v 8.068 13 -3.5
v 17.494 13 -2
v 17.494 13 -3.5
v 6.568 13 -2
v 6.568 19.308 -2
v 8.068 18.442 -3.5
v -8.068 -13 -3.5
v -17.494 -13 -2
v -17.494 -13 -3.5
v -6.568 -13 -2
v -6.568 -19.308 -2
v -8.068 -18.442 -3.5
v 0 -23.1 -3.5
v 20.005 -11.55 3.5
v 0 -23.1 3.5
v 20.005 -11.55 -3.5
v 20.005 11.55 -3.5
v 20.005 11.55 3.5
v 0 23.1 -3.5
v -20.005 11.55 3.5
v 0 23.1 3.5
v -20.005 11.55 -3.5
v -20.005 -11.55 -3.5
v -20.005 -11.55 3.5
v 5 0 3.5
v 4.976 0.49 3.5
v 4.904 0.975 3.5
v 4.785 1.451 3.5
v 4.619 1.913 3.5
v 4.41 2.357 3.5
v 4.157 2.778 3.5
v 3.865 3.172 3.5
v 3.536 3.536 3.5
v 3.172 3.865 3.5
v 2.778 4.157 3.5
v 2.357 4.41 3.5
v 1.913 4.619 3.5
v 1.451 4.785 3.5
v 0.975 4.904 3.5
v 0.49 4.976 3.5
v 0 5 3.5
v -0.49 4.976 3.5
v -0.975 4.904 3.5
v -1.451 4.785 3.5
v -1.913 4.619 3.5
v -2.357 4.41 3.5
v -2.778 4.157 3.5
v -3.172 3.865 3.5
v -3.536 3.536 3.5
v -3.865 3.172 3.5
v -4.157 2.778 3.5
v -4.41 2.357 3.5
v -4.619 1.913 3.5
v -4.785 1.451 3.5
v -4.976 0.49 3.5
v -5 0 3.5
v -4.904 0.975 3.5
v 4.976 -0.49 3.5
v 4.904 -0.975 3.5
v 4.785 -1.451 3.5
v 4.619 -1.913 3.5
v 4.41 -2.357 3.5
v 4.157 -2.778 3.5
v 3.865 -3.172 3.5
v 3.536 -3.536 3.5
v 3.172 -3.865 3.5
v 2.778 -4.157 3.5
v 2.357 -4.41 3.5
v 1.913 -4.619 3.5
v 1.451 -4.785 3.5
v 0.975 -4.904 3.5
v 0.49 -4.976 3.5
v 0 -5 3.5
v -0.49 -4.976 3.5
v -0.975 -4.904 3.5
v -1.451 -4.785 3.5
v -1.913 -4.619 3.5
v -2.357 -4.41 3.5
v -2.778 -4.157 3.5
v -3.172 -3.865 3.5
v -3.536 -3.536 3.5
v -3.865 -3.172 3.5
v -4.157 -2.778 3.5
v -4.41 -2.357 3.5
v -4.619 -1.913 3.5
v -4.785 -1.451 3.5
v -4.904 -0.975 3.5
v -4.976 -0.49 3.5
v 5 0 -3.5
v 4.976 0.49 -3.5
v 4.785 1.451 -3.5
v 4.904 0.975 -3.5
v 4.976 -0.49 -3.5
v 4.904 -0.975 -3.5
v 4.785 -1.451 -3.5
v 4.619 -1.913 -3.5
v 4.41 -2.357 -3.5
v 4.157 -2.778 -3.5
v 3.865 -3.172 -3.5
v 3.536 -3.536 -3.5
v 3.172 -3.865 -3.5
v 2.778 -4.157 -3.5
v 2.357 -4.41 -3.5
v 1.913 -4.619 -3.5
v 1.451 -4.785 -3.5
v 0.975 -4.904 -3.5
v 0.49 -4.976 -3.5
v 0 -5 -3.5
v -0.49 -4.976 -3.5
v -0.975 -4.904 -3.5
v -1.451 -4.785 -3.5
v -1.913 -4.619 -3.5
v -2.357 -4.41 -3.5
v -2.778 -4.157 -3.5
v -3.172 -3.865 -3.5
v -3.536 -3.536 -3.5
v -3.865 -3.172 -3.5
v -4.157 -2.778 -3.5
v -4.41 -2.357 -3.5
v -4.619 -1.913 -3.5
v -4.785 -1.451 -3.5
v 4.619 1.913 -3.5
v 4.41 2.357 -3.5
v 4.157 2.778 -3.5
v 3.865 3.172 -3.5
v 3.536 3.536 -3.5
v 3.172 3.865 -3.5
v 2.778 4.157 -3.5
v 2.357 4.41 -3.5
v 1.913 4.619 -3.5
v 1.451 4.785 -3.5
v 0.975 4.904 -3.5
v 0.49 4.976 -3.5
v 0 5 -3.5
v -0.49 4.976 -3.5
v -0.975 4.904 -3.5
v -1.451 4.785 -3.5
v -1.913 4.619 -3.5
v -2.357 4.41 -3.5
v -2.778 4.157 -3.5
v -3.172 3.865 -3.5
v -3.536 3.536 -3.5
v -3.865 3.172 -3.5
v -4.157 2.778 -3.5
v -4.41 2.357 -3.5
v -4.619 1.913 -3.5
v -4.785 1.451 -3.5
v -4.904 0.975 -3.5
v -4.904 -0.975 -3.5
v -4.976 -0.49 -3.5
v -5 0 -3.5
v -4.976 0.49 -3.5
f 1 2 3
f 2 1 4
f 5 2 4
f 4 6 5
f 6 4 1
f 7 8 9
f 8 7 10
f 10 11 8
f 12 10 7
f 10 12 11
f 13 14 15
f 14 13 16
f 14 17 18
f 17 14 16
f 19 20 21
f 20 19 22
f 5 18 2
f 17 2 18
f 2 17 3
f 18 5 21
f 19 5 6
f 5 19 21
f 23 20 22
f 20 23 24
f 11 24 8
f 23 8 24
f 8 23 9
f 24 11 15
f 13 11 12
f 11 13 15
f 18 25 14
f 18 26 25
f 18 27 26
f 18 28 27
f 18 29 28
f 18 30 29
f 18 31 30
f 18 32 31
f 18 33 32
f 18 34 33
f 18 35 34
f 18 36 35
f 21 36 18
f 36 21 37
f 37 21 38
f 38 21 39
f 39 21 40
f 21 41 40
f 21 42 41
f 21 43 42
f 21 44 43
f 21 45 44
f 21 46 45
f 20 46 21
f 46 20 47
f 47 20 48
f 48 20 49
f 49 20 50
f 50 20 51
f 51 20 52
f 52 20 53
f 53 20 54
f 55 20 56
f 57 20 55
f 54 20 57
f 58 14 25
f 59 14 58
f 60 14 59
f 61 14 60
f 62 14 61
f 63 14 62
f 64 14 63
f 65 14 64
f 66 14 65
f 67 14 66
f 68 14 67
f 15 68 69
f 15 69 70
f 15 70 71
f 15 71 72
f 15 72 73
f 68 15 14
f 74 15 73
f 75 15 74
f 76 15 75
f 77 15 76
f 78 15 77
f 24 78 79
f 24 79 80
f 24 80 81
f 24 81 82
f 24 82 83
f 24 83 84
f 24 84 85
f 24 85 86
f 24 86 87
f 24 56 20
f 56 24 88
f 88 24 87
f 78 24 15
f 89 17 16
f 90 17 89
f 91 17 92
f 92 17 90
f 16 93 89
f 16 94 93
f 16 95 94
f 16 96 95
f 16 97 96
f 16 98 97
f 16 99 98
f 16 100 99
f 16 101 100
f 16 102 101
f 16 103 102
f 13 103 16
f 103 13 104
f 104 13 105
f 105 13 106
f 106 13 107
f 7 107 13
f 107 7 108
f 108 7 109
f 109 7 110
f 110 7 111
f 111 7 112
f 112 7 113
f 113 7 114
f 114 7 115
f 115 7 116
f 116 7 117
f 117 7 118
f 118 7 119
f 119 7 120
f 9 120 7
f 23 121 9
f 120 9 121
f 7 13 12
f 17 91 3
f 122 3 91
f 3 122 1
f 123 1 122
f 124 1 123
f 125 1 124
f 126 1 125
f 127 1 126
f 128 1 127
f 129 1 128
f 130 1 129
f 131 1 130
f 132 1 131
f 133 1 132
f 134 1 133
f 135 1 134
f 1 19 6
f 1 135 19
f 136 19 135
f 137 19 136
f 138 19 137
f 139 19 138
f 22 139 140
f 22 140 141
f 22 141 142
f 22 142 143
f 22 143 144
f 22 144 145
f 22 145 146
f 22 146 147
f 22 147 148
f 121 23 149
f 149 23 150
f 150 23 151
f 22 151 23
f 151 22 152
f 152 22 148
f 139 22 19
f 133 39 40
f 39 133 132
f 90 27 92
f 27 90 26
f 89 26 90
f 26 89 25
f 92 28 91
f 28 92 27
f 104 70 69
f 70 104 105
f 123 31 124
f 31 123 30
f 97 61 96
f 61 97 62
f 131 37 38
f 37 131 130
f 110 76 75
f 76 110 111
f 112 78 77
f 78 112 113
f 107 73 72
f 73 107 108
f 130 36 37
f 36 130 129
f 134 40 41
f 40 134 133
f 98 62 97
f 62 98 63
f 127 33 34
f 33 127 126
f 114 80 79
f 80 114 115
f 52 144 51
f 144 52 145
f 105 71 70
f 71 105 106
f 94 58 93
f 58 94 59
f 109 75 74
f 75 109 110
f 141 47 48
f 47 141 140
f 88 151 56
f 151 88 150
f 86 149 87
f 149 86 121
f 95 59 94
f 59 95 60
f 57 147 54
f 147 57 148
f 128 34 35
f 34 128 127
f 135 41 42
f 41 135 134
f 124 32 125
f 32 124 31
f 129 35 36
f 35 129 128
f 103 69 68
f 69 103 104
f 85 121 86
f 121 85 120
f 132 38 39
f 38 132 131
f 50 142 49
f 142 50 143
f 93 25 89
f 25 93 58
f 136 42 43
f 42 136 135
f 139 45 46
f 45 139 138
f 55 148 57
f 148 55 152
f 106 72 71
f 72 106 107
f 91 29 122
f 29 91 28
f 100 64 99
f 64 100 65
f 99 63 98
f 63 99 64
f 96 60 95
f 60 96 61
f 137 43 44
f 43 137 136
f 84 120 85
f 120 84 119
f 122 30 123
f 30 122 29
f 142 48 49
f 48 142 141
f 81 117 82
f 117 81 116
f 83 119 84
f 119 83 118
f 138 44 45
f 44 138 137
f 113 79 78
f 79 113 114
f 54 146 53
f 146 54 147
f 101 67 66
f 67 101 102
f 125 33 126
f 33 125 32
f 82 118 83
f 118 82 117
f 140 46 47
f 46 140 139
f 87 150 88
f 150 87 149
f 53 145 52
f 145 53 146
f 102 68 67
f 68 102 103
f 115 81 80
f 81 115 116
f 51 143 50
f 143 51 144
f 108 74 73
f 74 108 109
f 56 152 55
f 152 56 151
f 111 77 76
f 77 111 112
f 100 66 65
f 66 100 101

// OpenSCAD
module hexagonal_prism_with_hole_and_grooves() {
    difference() {
        // Hexagonal prism
        translate([0, 0, -3.5])
            rotate([0, 0, 30])
                cylinder(h=7, r=23.1, $fn=6);

        // Circular through-hole
        translate([0, 0, -10])
            cylinder(h=20, r=5, $fn=64);

        // V-shaped grooves
        for (angle = [0, 180]) {
            rotate([0, 0, angle])
                translate([0, 20, -3.5])
                    rotate([90, 0, 0])
                        chevron_groove();
        }
    }
}

module chevron_groove() {
    difference() {
        // Base groove shape
        translate([-23.1, -1.5, 0])
            cube([46.2, 3, 7]);

        // V-shape cut
        translate([-23.1, -1.5, 0])
            intersection() {
                cube([46.2, 3, 7]);
                rotate([0, 0, 45])
                    translate([-23.1, -23.1, 0])
                        cube([46.2, 46.2, 7]);
                rotate([0, 0, -45])
                    translate([-23.1, -23.1, 0])
                        cube([46.2, 46.2, 7]);
            }
    }
}

hexagonal_prism_with_hole_and_grooves();
